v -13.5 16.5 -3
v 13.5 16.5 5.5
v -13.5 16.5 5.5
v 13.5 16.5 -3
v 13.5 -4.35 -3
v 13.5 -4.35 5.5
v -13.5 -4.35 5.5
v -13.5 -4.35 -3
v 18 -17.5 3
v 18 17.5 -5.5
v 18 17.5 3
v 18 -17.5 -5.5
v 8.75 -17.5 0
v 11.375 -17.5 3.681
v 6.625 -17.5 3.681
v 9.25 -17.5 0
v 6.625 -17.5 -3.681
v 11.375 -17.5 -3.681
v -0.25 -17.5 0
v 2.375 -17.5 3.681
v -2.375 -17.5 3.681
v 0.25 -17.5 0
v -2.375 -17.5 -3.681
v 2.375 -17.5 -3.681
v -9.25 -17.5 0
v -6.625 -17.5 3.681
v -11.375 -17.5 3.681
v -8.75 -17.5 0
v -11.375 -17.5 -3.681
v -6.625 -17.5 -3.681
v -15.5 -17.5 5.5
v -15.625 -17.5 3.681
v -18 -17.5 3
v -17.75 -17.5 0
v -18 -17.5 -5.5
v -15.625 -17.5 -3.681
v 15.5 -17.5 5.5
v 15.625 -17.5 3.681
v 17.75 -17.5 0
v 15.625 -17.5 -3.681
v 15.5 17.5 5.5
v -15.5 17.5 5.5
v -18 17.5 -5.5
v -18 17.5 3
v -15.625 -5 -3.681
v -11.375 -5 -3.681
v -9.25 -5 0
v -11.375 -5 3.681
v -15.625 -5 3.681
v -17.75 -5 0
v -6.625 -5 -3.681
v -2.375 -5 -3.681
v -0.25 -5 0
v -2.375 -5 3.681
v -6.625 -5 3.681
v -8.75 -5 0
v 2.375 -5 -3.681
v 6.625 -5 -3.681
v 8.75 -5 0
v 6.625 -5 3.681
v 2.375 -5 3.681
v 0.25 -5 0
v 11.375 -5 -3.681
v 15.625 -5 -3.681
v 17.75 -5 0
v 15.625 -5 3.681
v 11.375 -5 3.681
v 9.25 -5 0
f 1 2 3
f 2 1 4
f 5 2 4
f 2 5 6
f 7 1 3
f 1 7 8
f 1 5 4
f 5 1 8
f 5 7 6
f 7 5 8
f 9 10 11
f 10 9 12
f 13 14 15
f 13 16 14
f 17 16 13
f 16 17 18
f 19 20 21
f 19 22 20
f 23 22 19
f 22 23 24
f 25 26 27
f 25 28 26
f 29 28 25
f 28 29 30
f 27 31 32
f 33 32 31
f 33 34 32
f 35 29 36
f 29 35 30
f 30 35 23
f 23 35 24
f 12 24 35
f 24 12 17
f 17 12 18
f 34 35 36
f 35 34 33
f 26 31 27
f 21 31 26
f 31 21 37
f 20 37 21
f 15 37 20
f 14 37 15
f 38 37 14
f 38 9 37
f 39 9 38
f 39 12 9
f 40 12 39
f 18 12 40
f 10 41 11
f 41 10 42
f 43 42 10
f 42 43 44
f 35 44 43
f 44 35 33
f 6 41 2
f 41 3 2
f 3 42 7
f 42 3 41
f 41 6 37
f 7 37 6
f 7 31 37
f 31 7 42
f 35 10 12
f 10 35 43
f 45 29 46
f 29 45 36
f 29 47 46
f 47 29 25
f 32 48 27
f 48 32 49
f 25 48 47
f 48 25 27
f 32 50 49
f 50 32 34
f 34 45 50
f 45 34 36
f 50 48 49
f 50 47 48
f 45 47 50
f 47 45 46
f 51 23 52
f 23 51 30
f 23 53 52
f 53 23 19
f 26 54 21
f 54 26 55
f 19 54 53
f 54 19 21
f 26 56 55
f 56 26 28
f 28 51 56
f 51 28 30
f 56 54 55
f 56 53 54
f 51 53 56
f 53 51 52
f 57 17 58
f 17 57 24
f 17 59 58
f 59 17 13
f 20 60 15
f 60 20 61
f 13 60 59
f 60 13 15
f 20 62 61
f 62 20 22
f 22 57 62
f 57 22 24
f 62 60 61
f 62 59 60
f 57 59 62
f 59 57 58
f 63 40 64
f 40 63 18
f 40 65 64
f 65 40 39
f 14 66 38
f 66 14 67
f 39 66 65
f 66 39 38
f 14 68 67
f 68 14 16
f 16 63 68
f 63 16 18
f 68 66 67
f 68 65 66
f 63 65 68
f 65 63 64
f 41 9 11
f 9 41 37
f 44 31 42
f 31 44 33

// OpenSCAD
rotate([90,0,0]) {
    difference() {
color([1,0,0]) {cube([36,11,35], center=true);}
translate([-13.5,0,15]) { cylinder($fn=6,20,4.25,4.25,true); }
translate([-4.5,0,15]) { cylinder($fn=6,20,4.25,4.25,true); }
translate([4.5,0,15]) { cylinder($fn=6,20,4.25,4.25,true); }
translate([13.5,0,15]) { cylinder($fn=6,20,4.25,4.25,true); }
translate([21,0,-25]) { rotate([0,0,45]) { cube([10,10,60]); }}
translate([-21,0,-25]) { rotate([0,0,45]) { cube([10,10,60]); }}
rotate([0,90,0]) {
    translate([13,5,0]) { cube([7,16,27],true); }
    translate([6.1,5,0]) { cube([7,16,27],true); }
    translate([-0.85,5,0]) { cube([7,16,27],true); }
}
}


}
